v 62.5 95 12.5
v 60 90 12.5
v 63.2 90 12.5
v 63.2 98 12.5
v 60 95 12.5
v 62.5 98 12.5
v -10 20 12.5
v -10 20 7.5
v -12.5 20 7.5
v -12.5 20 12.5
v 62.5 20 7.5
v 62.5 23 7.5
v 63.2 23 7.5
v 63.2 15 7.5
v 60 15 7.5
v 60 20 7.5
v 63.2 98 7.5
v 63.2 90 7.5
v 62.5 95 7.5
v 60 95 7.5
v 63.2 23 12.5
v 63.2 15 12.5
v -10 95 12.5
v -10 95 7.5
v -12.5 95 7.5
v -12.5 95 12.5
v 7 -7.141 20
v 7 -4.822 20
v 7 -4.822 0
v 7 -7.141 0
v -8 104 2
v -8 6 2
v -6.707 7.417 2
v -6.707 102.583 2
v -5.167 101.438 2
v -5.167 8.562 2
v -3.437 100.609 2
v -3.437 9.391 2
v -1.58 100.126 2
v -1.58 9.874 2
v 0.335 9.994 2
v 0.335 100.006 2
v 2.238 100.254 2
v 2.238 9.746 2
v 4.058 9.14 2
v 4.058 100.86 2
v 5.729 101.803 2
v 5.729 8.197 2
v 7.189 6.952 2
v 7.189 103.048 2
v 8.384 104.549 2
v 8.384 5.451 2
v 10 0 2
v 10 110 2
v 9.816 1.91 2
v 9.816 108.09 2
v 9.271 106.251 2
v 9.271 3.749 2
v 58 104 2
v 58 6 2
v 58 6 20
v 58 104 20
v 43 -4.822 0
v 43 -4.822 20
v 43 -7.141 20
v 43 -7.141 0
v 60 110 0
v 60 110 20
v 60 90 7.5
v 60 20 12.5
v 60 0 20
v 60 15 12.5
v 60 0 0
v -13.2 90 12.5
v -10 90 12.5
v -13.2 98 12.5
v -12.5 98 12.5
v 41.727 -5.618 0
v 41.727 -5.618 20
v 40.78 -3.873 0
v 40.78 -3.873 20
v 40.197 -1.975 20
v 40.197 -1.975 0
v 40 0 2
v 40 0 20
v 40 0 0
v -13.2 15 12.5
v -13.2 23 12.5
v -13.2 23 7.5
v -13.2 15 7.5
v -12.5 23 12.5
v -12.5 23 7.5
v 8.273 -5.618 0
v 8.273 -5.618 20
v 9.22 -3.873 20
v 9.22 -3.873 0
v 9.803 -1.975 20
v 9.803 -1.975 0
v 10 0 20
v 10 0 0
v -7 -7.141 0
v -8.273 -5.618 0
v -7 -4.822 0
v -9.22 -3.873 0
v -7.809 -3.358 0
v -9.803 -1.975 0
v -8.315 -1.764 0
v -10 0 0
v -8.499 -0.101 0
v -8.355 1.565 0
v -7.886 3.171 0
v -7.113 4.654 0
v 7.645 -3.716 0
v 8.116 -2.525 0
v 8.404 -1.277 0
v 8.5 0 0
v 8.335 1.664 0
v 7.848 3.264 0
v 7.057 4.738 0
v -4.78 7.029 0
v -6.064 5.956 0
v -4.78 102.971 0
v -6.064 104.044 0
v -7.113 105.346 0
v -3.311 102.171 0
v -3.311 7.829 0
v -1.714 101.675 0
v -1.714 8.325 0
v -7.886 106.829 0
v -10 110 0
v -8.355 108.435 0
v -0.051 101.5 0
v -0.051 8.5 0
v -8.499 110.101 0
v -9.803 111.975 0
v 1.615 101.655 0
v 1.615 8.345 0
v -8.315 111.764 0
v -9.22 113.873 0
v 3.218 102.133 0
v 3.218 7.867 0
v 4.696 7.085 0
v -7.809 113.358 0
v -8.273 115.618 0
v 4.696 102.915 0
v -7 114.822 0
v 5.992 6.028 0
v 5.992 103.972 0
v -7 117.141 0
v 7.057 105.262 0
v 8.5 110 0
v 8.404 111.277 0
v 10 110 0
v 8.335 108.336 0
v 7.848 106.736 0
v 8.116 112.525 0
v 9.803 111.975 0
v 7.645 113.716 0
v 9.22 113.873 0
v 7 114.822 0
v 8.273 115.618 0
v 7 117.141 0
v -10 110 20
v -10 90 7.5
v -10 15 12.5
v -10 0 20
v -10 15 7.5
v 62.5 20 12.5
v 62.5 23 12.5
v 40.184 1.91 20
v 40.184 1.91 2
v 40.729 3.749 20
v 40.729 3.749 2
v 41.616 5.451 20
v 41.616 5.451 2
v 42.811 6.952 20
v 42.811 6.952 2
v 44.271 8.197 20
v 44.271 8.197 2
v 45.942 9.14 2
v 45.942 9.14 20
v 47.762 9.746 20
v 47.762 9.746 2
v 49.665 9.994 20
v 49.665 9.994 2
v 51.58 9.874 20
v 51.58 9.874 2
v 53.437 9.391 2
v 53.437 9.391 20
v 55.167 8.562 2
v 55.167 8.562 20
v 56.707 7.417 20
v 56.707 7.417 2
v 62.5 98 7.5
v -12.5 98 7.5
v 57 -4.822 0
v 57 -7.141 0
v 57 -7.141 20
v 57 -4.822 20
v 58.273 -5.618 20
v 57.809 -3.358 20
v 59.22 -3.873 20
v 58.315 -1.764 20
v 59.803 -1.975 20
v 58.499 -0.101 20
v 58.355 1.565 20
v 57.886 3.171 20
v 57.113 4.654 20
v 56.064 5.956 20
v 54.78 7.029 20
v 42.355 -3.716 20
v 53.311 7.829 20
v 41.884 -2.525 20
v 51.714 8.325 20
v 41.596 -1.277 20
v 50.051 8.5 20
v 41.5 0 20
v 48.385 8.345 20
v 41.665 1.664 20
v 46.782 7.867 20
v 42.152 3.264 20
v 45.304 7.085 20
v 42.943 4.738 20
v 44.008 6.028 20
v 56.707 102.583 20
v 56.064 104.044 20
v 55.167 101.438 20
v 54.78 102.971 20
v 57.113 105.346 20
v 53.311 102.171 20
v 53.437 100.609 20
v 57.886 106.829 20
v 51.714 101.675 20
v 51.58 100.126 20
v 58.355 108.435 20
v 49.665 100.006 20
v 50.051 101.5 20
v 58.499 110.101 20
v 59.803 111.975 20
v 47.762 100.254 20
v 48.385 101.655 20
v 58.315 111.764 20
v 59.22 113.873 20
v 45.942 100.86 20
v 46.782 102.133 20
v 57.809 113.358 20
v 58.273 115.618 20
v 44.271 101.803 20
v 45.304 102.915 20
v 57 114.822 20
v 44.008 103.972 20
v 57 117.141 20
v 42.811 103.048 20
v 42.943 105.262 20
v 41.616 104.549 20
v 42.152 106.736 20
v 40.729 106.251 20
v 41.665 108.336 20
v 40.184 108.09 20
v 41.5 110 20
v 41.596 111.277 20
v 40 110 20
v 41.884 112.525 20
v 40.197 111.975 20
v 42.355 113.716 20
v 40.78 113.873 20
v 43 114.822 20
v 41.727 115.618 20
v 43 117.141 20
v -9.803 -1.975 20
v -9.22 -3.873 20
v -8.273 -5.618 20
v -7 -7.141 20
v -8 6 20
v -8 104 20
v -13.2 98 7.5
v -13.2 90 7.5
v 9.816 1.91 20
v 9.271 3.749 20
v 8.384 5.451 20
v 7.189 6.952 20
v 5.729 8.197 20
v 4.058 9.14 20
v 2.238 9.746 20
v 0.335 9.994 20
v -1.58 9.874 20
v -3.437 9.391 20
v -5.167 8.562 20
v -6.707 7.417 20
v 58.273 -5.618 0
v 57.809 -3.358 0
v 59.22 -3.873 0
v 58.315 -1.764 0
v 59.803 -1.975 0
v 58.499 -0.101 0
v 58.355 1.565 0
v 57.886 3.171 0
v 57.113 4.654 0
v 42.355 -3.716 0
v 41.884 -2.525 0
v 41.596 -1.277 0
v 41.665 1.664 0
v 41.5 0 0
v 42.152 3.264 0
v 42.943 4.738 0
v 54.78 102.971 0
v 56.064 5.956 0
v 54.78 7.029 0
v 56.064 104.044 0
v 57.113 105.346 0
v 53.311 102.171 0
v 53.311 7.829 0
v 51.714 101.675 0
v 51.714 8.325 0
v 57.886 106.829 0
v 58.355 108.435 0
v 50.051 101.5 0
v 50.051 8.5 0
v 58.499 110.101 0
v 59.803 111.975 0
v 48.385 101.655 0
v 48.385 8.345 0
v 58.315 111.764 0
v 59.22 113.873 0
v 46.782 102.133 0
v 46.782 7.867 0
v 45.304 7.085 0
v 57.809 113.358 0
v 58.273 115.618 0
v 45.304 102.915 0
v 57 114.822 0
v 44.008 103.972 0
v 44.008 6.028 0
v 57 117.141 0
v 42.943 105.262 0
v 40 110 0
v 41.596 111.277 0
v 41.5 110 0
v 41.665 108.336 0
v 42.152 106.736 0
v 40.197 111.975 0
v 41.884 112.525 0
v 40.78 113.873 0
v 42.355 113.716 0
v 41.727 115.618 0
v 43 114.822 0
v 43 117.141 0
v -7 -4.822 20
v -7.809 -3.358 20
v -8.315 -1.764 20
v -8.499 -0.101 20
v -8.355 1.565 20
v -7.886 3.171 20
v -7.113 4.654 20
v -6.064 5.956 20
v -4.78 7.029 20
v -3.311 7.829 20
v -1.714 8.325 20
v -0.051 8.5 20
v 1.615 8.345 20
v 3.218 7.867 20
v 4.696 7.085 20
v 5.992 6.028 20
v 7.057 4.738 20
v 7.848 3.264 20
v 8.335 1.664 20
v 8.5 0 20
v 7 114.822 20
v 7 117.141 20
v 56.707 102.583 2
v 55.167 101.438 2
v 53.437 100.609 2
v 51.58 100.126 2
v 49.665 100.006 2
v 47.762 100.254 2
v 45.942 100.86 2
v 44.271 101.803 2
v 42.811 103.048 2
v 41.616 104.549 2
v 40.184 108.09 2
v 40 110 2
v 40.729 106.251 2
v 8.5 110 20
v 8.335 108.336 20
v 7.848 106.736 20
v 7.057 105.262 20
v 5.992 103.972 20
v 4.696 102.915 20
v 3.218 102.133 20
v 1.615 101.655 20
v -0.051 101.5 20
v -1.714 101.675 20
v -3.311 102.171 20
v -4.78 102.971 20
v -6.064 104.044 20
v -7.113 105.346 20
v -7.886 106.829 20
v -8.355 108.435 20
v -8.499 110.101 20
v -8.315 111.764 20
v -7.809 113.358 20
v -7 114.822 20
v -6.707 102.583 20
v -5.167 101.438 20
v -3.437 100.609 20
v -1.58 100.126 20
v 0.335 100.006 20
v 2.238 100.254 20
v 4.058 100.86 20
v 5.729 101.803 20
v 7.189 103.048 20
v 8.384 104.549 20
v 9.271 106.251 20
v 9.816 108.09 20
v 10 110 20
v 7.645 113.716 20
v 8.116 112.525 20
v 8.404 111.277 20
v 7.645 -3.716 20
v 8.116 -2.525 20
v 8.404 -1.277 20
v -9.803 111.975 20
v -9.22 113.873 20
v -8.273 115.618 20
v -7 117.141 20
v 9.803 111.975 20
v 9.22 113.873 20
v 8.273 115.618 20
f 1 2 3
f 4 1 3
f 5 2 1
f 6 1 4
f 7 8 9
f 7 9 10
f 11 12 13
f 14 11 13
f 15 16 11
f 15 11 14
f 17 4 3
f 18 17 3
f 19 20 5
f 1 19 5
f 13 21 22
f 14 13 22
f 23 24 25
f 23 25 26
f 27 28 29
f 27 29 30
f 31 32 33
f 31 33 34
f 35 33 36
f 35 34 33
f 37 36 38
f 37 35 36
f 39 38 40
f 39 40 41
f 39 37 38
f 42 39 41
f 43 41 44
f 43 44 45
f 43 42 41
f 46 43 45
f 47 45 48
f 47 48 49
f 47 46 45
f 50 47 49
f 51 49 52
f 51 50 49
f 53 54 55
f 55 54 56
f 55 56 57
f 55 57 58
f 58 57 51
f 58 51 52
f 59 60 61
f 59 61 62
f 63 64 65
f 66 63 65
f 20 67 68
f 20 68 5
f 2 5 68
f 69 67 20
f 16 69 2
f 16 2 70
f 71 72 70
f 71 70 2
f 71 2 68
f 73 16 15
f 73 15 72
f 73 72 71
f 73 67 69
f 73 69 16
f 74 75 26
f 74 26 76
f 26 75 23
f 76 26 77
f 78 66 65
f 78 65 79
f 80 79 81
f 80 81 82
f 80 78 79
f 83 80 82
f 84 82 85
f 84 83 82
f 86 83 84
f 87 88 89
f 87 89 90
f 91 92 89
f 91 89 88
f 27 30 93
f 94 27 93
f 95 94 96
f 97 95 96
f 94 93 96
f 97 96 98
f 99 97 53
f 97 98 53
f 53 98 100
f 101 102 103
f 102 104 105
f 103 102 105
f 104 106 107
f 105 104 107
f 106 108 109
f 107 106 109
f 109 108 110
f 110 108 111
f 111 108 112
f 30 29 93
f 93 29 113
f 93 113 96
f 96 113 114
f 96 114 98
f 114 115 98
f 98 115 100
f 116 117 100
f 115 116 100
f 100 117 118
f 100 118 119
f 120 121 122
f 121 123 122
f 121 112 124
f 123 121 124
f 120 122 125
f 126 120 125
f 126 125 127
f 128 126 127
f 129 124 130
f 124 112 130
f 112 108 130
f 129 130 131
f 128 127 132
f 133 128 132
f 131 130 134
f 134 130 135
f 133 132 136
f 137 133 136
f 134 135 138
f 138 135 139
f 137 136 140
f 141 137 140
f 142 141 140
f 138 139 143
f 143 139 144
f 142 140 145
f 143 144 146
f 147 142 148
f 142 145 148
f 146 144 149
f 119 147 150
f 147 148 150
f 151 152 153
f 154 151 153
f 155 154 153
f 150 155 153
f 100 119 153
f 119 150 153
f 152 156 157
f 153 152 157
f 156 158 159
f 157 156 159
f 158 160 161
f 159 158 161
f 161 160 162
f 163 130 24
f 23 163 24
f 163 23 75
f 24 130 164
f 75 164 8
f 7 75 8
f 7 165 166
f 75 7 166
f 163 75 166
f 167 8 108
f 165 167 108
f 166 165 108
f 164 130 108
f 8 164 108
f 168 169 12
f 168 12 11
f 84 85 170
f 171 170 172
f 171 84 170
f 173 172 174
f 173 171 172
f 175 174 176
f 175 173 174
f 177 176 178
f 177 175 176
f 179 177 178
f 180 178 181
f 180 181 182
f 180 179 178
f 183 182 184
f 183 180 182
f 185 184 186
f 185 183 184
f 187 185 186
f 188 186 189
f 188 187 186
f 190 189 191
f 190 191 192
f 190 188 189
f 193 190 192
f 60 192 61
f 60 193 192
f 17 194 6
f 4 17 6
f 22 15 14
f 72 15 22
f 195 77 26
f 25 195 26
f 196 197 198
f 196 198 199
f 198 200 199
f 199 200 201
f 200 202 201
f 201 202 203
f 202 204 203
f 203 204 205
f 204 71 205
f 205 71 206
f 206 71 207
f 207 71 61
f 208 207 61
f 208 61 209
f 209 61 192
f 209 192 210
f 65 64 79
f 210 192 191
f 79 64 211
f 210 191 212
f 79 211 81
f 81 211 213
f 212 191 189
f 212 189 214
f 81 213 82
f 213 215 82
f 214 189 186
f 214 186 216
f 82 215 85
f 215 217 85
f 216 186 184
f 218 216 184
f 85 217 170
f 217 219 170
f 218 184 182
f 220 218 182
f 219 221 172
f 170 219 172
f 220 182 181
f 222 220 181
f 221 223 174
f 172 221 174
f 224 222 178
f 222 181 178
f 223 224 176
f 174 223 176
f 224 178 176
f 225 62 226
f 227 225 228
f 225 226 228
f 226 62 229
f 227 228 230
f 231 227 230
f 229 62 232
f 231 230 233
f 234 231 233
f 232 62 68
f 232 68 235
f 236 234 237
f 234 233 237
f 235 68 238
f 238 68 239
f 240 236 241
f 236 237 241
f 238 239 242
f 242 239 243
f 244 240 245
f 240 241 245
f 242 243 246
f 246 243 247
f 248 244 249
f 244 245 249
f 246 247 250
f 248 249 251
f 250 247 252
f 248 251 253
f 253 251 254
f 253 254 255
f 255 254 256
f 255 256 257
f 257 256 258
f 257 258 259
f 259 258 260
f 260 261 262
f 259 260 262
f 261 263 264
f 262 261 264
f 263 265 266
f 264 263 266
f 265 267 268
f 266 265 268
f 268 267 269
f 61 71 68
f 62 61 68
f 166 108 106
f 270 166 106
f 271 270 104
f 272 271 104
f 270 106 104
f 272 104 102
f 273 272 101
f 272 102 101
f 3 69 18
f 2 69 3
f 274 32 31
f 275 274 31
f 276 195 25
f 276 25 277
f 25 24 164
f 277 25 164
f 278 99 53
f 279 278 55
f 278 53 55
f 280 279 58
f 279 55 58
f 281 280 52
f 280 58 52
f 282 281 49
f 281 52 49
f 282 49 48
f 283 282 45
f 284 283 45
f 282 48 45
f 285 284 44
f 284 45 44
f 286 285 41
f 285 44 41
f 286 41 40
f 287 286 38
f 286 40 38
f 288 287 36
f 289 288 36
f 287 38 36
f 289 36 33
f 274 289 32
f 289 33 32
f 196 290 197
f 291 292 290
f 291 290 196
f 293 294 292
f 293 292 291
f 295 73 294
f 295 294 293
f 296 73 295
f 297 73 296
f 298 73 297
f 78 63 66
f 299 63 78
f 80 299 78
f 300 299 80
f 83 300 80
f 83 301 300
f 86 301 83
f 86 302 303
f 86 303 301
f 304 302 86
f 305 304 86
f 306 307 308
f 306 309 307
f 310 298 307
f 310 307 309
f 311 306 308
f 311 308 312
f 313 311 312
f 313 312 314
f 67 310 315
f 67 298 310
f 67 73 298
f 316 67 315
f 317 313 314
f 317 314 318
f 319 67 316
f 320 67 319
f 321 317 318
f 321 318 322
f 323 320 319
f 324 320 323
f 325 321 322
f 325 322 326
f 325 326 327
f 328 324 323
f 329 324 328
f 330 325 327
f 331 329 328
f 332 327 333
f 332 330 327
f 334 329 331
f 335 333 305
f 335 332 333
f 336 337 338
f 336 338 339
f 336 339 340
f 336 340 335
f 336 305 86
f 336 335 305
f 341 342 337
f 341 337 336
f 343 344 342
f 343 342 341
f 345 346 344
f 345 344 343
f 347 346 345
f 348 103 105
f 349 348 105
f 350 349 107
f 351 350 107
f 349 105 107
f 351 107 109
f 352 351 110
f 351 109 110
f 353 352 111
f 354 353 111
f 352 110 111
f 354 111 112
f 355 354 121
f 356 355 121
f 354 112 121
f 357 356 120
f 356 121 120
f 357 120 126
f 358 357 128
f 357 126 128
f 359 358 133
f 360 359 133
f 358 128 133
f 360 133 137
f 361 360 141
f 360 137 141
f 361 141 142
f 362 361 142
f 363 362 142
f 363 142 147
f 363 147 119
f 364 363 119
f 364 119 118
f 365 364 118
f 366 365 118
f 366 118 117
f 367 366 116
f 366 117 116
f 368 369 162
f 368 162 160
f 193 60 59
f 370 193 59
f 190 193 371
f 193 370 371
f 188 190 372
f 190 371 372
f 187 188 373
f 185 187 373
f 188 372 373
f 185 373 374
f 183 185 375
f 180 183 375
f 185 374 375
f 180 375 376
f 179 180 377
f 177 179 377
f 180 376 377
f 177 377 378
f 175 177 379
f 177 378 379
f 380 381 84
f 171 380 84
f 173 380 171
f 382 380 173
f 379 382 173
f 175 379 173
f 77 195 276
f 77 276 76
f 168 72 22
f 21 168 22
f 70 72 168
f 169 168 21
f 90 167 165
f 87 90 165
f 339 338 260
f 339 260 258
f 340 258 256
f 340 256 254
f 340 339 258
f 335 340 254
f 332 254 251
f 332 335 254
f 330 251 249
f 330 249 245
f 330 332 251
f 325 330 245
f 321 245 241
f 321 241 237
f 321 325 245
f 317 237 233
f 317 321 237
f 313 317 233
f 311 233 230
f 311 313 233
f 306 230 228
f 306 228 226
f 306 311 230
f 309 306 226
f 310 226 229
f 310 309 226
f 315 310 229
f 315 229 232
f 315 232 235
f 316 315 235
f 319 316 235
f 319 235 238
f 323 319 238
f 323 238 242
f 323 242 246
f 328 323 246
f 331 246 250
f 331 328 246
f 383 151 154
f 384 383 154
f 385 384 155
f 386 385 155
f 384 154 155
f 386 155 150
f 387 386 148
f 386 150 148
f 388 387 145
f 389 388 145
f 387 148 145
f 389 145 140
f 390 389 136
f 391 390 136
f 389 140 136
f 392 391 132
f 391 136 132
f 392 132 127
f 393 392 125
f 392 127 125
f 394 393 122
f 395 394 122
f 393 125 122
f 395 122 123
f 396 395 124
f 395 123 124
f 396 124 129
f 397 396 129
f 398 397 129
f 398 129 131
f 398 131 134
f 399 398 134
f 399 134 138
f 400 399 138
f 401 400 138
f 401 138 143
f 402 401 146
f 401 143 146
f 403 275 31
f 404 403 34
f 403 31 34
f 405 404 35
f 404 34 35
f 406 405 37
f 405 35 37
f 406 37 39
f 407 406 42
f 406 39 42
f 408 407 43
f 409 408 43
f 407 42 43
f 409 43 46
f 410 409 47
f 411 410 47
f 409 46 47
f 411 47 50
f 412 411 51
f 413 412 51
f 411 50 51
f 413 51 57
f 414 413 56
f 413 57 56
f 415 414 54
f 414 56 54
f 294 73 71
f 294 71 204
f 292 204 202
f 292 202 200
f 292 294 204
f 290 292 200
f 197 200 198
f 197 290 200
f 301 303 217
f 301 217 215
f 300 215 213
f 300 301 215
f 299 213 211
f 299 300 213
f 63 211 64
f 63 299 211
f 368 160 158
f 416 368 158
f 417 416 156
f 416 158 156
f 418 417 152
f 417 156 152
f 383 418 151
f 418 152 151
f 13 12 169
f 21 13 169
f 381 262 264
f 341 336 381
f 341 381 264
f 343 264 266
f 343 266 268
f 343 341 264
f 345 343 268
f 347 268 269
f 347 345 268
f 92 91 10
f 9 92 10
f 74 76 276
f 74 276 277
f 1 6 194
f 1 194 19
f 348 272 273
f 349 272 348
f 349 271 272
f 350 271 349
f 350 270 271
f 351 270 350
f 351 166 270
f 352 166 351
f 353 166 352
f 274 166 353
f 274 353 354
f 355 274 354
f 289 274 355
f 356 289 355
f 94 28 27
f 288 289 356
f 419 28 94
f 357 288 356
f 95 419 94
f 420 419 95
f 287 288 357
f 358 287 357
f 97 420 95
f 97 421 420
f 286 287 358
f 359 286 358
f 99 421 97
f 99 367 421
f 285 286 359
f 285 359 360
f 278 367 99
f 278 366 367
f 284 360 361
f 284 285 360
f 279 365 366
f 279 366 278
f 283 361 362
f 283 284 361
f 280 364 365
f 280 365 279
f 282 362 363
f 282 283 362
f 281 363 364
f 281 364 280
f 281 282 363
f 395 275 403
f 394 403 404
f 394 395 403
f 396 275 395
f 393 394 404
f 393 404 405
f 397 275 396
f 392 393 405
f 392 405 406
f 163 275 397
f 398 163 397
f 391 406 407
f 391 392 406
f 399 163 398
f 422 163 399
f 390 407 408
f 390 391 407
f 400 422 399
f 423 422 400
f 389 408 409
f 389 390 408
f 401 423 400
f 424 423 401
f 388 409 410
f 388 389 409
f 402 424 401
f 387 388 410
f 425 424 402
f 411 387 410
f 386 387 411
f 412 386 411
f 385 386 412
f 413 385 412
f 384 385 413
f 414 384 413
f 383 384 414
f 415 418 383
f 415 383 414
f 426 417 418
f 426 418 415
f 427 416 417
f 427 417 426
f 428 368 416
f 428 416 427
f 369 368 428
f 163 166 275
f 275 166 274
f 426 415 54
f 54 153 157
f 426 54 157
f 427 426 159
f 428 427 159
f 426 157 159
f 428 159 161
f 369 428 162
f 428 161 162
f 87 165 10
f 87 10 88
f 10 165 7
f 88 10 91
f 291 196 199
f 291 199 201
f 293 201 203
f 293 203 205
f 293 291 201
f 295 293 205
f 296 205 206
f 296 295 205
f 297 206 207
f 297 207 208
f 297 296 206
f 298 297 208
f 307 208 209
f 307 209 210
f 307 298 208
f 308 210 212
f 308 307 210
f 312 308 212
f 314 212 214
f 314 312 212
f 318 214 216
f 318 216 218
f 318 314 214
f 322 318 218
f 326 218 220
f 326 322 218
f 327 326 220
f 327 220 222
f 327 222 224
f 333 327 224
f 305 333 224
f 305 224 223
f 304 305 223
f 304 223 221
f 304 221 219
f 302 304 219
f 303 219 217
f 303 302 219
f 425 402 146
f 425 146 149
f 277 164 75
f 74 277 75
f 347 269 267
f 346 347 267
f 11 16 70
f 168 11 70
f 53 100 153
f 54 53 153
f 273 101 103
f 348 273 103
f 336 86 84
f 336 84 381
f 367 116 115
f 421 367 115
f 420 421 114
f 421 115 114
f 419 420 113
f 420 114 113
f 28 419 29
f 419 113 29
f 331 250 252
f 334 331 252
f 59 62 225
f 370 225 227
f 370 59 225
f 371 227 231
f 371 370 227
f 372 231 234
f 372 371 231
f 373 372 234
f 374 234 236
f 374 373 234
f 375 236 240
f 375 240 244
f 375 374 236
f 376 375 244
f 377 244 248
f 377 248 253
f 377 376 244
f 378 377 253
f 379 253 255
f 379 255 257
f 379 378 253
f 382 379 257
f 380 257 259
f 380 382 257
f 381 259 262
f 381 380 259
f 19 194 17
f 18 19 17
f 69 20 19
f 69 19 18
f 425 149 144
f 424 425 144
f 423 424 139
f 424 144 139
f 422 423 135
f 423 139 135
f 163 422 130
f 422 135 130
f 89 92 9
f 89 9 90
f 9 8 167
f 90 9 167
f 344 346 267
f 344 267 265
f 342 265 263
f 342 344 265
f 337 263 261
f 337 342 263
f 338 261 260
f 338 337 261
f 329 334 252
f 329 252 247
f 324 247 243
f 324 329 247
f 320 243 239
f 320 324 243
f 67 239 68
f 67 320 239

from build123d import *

# Parameters (mm, degrees)
F1_DEPTH = 20
F2_DEPTH = 2
F3_W     = 5
F3_H     = 5
F3_W_2   = 3
F4_DEPTH = 3.2
F5_DEPTH = 2.5


with BuildPart() as f1:
    # F0 (on Top) → F1 (new body)
    with BuildSketch(Plane.XY):
        with BuildLine():
            ThreePointArc((-10, 0), (-9.486833, 3.162278), (-8, 6))
            Line((-8, 6), (-8, 104))
            ThreePointArc((-8, 104), (-9.486833, 106.837722), (-10, 110))
            Line((-10, 110), (-10, 0))
        make_face()
        with BuildLine():
            ThreePointArc((-8, 104), (3.162278, 100.513167), (10, 110))
            ThreePointArc((10, 110), (9.219544, 113.872983), (7, 117.141428))
            Line((7, 117.141428), (7, 114.821825))
            ThreePointArc((7, 114.821825), (8.116342, 112.524876), (8.5, 110))
            ThreePointArc((8.5, 110), (-2.524876, 101.883658), (-7, 114.821825))
            Line((-7, 114.821825), (-7, 117.141428))
            ThreePointArc((-7, 117.141428), (-9.219544, 113.872983), (-10, 110))
            ThreePointArc((-10, 110), (-9.486833, 106.837722), (-8, 104))
        make_face()
        with BuildLine():
            ThreePointArc((7, -7.141428), (9.219544, -3.872983), (10, 0))
            ThreePointArc((10, 0), (3.162278, 9.486833), (-8, 6))
            ThreePointArc((-8, 6), (-9.486833, 3.162278), (-10, 0))
            ThreePointArc((-10, 0), (-9.219544, -3.872983), (-7, -7.141428))
            Line((-7, -7.141428), (-7, -4.821825))
            ThreePointArc((-7, -4.821825), (-2.524876, 8.116342), (8.5, 0))
            ThreePointArc((8.5, 0), (8.116342, -2.524876), (7, -4.821825))
            Line((7, -4.821825), (7, -7.141428))
        make_face()
    extrude(amount=F1_DEPTH)

    # F0 (on Top) → F2 (join)
    with BuildSketch(Plane.XY):
        with BuildLine():
            ThreePointArc((-8, 6), (3.162278, 9.486833), (10, 0))
            Line((10, 0), (10, 110))
            ThreePointArc((10, 110), (3.162278, 100.513167), (-8, 104))
            Line((-8, 104), (-8, 6))
        make_face()
    extrude(amount=F2_DEPTH)

    # F3 (on face) → F4 (join)
    with BuildSketch(Plane(origin=(-10, 0, 0), x_dir=(0, -1, 0), z_dir=(-1, 0, 0))):
        with Locations((-92.5, 10)):
            Rectangle(F3_W, F3_H)
        with Locations((-17.5, 10)):
            Rectangle(F3_W, F3_H)
        with Locations((-96.5, 10)):
            Rectangle(F3_W_2, F3_H)
        with Locations((-21.5, 10)):
            Rectangle(F3_W_2, F3_H)
    extrude(amount=F4_DEPTH)

    # F3 (on face) → F5 (cut)
    with BuildSketch(Plane(origin=(-10, 0, 0), x_dir=(0, -1, 0), z_dir=(-1, 0, 0))):
        with Locations((-96.5, 10)):
            Rectangle(F3_W_2, F3_H)
        with Locations((-21.5, 10)):
            Rectangle(F3_W_2, F3_H)
    extrude(amount=F5_DEPTH, mode=Mode.SUBTRACT)


with BuildPart() as f7_1:
    # F7: instance of F1
    add(f1.part.mirror(Plane.YZ.offset(25)))


solid = Compound([f1.part, f7_1.part])
